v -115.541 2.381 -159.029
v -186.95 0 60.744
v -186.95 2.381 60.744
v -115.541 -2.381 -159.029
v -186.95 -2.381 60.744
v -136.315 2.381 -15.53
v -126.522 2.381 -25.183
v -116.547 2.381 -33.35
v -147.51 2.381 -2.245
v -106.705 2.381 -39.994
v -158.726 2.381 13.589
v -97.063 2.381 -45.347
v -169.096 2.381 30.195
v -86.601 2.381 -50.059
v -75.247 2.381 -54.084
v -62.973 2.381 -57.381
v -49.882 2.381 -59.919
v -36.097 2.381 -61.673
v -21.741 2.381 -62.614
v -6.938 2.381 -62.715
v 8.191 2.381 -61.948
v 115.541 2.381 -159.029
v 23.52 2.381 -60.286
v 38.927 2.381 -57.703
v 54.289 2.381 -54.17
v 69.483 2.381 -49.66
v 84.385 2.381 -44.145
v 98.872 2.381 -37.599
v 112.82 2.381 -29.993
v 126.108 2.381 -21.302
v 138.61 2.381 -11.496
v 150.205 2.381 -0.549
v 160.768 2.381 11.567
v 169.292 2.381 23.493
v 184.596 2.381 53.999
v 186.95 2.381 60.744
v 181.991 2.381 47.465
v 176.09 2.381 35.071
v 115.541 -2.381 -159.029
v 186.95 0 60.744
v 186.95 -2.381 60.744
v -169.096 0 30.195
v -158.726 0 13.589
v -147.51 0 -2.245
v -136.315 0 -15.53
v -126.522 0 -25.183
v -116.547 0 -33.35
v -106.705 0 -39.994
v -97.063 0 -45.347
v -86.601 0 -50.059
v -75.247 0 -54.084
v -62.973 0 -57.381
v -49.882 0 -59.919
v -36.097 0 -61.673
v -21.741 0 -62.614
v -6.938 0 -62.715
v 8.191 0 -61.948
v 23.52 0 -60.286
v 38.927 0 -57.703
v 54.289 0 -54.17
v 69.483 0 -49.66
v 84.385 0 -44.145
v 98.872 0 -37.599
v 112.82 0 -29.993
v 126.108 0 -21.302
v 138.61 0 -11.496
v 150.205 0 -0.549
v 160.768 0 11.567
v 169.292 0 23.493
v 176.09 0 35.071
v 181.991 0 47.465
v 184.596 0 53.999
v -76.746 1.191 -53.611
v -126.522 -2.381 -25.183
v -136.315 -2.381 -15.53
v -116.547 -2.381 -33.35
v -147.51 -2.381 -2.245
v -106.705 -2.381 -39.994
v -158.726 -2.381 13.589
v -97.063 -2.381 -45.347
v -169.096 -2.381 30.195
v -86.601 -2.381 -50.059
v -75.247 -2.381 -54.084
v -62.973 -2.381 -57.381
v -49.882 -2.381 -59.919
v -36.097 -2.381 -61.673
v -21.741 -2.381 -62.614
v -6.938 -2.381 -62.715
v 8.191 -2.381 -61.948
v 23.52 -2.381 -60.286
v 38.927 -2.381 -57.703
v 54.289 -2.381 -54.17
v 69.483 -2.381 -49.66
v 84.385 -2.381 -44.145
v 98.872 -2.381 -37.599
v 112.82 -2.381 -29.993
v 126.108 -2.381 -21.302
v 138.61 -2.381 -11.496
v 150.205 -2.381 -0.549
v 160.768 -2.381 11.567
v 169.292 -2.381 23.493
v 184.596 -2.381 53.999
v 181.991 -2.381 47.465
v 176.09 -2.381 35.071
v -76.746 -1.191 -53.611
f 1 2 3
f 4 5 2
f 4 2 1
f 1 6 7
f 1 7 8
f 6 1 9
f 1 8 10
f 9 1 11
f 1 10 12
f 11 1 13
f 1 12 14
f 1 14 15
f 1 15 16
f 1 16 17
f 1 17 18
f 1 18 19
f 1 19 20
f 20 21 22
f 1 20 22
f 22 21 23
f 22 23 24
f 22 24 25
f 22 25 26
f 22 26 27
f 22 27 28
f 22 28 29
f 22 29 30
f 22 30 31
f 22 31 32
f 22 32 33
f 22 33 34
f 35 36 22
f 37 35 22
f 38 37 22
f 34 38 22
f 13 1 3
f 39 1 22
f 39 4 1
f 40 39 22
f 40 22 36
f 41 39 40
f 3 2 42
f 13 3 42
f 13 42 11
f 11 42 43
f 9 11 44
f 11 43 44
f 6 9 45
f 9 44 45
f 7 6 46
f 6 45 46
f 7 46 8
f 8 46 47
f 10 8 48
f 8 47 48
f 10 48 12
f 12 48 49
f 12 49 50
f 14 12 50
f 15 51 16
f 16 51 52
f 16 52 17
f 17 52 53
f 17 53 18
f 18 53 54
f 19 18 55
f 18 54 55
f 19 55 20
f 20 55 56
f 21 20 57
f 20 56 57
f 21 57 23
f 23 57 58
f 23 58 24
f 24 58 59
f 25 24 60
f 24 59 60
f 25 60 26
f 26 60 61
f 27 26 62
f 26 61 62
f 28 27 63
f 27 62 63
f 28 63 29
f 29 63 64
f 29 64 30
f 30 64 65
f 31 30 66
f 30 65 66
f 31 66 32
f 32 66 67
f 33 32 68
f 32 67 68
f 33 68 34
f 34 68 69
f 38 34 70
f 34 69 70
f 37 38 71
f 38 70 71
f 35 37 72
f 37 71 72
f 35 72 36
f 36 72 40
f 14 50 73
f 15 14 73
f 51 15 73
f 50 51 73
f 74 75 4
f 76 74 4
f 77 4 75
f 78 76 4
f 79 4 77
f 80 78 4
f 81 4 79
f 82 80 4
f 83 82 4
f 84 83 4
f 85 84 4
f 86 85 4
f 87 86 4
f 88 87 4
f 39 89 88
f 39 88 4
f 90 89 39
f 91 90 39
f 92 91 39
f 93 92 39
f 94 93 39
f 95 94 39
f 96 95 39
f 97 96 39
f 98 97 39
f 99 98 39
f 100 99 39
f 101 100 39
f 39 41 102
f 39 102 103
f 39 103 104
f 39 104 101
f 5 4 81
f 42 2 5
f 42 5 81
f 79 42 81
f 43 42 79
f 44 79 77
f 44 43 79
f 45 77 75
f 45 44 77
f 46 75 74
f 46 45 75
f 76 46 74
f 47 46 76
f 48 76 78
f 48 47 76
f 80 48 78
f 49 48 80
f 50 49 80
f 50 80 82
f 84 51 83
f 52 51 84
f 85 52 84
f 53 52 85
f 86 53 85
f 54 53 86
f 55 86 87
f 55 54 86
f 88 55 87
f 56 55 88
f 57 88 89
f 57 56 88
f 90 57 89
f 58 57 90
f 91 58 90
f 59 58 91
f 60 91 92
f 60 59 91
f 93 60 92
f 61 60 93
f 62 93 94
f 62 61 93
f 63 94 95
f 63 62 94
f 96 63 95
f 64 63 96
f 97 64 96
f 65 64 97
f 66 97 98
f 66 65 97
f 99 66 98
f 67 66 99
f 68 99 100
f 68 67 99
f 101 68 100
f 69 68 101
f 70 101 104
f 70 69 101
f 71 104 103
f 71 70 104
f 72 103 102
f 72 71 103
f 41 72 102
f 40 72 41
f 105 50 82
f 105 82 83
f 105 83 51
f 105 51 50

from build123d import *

# Parameters (mm, degrees)
F1_DEPTH = 2.38125


with BuildPart() as f1:
    # F0 (on Front) → F1 (new body, symmetric)
    with BuildSketch(Plane.XZ):
        with BuildLine():
            Line((-115.5414439804, -159.0291545598), (115.5414439804, -159.0291545598))
            Line((115.5414439804, -159.0291545598), (186.9499834696, 60.7437318397))
            add(Edge.make_bspline(
                [(-186.9499834696, 60.7437318397), (-158.5344370585, 12.5341240839), (-105.8621510044, -97.8968048071), (149.6138950392, -54.164932865), (186.9499834696, 60.7437318397)],
                knots=[0, 0, 0, 0, 0.4263853727, 1, 1, 1, 1], degree=3))
            Line((-186.9499834696, 60.7437318397), (-115.5414439804, -159.0291545598))
        make_face()
    extrude(amount=F1_DEPTH, both=True)


solid = f1.part
